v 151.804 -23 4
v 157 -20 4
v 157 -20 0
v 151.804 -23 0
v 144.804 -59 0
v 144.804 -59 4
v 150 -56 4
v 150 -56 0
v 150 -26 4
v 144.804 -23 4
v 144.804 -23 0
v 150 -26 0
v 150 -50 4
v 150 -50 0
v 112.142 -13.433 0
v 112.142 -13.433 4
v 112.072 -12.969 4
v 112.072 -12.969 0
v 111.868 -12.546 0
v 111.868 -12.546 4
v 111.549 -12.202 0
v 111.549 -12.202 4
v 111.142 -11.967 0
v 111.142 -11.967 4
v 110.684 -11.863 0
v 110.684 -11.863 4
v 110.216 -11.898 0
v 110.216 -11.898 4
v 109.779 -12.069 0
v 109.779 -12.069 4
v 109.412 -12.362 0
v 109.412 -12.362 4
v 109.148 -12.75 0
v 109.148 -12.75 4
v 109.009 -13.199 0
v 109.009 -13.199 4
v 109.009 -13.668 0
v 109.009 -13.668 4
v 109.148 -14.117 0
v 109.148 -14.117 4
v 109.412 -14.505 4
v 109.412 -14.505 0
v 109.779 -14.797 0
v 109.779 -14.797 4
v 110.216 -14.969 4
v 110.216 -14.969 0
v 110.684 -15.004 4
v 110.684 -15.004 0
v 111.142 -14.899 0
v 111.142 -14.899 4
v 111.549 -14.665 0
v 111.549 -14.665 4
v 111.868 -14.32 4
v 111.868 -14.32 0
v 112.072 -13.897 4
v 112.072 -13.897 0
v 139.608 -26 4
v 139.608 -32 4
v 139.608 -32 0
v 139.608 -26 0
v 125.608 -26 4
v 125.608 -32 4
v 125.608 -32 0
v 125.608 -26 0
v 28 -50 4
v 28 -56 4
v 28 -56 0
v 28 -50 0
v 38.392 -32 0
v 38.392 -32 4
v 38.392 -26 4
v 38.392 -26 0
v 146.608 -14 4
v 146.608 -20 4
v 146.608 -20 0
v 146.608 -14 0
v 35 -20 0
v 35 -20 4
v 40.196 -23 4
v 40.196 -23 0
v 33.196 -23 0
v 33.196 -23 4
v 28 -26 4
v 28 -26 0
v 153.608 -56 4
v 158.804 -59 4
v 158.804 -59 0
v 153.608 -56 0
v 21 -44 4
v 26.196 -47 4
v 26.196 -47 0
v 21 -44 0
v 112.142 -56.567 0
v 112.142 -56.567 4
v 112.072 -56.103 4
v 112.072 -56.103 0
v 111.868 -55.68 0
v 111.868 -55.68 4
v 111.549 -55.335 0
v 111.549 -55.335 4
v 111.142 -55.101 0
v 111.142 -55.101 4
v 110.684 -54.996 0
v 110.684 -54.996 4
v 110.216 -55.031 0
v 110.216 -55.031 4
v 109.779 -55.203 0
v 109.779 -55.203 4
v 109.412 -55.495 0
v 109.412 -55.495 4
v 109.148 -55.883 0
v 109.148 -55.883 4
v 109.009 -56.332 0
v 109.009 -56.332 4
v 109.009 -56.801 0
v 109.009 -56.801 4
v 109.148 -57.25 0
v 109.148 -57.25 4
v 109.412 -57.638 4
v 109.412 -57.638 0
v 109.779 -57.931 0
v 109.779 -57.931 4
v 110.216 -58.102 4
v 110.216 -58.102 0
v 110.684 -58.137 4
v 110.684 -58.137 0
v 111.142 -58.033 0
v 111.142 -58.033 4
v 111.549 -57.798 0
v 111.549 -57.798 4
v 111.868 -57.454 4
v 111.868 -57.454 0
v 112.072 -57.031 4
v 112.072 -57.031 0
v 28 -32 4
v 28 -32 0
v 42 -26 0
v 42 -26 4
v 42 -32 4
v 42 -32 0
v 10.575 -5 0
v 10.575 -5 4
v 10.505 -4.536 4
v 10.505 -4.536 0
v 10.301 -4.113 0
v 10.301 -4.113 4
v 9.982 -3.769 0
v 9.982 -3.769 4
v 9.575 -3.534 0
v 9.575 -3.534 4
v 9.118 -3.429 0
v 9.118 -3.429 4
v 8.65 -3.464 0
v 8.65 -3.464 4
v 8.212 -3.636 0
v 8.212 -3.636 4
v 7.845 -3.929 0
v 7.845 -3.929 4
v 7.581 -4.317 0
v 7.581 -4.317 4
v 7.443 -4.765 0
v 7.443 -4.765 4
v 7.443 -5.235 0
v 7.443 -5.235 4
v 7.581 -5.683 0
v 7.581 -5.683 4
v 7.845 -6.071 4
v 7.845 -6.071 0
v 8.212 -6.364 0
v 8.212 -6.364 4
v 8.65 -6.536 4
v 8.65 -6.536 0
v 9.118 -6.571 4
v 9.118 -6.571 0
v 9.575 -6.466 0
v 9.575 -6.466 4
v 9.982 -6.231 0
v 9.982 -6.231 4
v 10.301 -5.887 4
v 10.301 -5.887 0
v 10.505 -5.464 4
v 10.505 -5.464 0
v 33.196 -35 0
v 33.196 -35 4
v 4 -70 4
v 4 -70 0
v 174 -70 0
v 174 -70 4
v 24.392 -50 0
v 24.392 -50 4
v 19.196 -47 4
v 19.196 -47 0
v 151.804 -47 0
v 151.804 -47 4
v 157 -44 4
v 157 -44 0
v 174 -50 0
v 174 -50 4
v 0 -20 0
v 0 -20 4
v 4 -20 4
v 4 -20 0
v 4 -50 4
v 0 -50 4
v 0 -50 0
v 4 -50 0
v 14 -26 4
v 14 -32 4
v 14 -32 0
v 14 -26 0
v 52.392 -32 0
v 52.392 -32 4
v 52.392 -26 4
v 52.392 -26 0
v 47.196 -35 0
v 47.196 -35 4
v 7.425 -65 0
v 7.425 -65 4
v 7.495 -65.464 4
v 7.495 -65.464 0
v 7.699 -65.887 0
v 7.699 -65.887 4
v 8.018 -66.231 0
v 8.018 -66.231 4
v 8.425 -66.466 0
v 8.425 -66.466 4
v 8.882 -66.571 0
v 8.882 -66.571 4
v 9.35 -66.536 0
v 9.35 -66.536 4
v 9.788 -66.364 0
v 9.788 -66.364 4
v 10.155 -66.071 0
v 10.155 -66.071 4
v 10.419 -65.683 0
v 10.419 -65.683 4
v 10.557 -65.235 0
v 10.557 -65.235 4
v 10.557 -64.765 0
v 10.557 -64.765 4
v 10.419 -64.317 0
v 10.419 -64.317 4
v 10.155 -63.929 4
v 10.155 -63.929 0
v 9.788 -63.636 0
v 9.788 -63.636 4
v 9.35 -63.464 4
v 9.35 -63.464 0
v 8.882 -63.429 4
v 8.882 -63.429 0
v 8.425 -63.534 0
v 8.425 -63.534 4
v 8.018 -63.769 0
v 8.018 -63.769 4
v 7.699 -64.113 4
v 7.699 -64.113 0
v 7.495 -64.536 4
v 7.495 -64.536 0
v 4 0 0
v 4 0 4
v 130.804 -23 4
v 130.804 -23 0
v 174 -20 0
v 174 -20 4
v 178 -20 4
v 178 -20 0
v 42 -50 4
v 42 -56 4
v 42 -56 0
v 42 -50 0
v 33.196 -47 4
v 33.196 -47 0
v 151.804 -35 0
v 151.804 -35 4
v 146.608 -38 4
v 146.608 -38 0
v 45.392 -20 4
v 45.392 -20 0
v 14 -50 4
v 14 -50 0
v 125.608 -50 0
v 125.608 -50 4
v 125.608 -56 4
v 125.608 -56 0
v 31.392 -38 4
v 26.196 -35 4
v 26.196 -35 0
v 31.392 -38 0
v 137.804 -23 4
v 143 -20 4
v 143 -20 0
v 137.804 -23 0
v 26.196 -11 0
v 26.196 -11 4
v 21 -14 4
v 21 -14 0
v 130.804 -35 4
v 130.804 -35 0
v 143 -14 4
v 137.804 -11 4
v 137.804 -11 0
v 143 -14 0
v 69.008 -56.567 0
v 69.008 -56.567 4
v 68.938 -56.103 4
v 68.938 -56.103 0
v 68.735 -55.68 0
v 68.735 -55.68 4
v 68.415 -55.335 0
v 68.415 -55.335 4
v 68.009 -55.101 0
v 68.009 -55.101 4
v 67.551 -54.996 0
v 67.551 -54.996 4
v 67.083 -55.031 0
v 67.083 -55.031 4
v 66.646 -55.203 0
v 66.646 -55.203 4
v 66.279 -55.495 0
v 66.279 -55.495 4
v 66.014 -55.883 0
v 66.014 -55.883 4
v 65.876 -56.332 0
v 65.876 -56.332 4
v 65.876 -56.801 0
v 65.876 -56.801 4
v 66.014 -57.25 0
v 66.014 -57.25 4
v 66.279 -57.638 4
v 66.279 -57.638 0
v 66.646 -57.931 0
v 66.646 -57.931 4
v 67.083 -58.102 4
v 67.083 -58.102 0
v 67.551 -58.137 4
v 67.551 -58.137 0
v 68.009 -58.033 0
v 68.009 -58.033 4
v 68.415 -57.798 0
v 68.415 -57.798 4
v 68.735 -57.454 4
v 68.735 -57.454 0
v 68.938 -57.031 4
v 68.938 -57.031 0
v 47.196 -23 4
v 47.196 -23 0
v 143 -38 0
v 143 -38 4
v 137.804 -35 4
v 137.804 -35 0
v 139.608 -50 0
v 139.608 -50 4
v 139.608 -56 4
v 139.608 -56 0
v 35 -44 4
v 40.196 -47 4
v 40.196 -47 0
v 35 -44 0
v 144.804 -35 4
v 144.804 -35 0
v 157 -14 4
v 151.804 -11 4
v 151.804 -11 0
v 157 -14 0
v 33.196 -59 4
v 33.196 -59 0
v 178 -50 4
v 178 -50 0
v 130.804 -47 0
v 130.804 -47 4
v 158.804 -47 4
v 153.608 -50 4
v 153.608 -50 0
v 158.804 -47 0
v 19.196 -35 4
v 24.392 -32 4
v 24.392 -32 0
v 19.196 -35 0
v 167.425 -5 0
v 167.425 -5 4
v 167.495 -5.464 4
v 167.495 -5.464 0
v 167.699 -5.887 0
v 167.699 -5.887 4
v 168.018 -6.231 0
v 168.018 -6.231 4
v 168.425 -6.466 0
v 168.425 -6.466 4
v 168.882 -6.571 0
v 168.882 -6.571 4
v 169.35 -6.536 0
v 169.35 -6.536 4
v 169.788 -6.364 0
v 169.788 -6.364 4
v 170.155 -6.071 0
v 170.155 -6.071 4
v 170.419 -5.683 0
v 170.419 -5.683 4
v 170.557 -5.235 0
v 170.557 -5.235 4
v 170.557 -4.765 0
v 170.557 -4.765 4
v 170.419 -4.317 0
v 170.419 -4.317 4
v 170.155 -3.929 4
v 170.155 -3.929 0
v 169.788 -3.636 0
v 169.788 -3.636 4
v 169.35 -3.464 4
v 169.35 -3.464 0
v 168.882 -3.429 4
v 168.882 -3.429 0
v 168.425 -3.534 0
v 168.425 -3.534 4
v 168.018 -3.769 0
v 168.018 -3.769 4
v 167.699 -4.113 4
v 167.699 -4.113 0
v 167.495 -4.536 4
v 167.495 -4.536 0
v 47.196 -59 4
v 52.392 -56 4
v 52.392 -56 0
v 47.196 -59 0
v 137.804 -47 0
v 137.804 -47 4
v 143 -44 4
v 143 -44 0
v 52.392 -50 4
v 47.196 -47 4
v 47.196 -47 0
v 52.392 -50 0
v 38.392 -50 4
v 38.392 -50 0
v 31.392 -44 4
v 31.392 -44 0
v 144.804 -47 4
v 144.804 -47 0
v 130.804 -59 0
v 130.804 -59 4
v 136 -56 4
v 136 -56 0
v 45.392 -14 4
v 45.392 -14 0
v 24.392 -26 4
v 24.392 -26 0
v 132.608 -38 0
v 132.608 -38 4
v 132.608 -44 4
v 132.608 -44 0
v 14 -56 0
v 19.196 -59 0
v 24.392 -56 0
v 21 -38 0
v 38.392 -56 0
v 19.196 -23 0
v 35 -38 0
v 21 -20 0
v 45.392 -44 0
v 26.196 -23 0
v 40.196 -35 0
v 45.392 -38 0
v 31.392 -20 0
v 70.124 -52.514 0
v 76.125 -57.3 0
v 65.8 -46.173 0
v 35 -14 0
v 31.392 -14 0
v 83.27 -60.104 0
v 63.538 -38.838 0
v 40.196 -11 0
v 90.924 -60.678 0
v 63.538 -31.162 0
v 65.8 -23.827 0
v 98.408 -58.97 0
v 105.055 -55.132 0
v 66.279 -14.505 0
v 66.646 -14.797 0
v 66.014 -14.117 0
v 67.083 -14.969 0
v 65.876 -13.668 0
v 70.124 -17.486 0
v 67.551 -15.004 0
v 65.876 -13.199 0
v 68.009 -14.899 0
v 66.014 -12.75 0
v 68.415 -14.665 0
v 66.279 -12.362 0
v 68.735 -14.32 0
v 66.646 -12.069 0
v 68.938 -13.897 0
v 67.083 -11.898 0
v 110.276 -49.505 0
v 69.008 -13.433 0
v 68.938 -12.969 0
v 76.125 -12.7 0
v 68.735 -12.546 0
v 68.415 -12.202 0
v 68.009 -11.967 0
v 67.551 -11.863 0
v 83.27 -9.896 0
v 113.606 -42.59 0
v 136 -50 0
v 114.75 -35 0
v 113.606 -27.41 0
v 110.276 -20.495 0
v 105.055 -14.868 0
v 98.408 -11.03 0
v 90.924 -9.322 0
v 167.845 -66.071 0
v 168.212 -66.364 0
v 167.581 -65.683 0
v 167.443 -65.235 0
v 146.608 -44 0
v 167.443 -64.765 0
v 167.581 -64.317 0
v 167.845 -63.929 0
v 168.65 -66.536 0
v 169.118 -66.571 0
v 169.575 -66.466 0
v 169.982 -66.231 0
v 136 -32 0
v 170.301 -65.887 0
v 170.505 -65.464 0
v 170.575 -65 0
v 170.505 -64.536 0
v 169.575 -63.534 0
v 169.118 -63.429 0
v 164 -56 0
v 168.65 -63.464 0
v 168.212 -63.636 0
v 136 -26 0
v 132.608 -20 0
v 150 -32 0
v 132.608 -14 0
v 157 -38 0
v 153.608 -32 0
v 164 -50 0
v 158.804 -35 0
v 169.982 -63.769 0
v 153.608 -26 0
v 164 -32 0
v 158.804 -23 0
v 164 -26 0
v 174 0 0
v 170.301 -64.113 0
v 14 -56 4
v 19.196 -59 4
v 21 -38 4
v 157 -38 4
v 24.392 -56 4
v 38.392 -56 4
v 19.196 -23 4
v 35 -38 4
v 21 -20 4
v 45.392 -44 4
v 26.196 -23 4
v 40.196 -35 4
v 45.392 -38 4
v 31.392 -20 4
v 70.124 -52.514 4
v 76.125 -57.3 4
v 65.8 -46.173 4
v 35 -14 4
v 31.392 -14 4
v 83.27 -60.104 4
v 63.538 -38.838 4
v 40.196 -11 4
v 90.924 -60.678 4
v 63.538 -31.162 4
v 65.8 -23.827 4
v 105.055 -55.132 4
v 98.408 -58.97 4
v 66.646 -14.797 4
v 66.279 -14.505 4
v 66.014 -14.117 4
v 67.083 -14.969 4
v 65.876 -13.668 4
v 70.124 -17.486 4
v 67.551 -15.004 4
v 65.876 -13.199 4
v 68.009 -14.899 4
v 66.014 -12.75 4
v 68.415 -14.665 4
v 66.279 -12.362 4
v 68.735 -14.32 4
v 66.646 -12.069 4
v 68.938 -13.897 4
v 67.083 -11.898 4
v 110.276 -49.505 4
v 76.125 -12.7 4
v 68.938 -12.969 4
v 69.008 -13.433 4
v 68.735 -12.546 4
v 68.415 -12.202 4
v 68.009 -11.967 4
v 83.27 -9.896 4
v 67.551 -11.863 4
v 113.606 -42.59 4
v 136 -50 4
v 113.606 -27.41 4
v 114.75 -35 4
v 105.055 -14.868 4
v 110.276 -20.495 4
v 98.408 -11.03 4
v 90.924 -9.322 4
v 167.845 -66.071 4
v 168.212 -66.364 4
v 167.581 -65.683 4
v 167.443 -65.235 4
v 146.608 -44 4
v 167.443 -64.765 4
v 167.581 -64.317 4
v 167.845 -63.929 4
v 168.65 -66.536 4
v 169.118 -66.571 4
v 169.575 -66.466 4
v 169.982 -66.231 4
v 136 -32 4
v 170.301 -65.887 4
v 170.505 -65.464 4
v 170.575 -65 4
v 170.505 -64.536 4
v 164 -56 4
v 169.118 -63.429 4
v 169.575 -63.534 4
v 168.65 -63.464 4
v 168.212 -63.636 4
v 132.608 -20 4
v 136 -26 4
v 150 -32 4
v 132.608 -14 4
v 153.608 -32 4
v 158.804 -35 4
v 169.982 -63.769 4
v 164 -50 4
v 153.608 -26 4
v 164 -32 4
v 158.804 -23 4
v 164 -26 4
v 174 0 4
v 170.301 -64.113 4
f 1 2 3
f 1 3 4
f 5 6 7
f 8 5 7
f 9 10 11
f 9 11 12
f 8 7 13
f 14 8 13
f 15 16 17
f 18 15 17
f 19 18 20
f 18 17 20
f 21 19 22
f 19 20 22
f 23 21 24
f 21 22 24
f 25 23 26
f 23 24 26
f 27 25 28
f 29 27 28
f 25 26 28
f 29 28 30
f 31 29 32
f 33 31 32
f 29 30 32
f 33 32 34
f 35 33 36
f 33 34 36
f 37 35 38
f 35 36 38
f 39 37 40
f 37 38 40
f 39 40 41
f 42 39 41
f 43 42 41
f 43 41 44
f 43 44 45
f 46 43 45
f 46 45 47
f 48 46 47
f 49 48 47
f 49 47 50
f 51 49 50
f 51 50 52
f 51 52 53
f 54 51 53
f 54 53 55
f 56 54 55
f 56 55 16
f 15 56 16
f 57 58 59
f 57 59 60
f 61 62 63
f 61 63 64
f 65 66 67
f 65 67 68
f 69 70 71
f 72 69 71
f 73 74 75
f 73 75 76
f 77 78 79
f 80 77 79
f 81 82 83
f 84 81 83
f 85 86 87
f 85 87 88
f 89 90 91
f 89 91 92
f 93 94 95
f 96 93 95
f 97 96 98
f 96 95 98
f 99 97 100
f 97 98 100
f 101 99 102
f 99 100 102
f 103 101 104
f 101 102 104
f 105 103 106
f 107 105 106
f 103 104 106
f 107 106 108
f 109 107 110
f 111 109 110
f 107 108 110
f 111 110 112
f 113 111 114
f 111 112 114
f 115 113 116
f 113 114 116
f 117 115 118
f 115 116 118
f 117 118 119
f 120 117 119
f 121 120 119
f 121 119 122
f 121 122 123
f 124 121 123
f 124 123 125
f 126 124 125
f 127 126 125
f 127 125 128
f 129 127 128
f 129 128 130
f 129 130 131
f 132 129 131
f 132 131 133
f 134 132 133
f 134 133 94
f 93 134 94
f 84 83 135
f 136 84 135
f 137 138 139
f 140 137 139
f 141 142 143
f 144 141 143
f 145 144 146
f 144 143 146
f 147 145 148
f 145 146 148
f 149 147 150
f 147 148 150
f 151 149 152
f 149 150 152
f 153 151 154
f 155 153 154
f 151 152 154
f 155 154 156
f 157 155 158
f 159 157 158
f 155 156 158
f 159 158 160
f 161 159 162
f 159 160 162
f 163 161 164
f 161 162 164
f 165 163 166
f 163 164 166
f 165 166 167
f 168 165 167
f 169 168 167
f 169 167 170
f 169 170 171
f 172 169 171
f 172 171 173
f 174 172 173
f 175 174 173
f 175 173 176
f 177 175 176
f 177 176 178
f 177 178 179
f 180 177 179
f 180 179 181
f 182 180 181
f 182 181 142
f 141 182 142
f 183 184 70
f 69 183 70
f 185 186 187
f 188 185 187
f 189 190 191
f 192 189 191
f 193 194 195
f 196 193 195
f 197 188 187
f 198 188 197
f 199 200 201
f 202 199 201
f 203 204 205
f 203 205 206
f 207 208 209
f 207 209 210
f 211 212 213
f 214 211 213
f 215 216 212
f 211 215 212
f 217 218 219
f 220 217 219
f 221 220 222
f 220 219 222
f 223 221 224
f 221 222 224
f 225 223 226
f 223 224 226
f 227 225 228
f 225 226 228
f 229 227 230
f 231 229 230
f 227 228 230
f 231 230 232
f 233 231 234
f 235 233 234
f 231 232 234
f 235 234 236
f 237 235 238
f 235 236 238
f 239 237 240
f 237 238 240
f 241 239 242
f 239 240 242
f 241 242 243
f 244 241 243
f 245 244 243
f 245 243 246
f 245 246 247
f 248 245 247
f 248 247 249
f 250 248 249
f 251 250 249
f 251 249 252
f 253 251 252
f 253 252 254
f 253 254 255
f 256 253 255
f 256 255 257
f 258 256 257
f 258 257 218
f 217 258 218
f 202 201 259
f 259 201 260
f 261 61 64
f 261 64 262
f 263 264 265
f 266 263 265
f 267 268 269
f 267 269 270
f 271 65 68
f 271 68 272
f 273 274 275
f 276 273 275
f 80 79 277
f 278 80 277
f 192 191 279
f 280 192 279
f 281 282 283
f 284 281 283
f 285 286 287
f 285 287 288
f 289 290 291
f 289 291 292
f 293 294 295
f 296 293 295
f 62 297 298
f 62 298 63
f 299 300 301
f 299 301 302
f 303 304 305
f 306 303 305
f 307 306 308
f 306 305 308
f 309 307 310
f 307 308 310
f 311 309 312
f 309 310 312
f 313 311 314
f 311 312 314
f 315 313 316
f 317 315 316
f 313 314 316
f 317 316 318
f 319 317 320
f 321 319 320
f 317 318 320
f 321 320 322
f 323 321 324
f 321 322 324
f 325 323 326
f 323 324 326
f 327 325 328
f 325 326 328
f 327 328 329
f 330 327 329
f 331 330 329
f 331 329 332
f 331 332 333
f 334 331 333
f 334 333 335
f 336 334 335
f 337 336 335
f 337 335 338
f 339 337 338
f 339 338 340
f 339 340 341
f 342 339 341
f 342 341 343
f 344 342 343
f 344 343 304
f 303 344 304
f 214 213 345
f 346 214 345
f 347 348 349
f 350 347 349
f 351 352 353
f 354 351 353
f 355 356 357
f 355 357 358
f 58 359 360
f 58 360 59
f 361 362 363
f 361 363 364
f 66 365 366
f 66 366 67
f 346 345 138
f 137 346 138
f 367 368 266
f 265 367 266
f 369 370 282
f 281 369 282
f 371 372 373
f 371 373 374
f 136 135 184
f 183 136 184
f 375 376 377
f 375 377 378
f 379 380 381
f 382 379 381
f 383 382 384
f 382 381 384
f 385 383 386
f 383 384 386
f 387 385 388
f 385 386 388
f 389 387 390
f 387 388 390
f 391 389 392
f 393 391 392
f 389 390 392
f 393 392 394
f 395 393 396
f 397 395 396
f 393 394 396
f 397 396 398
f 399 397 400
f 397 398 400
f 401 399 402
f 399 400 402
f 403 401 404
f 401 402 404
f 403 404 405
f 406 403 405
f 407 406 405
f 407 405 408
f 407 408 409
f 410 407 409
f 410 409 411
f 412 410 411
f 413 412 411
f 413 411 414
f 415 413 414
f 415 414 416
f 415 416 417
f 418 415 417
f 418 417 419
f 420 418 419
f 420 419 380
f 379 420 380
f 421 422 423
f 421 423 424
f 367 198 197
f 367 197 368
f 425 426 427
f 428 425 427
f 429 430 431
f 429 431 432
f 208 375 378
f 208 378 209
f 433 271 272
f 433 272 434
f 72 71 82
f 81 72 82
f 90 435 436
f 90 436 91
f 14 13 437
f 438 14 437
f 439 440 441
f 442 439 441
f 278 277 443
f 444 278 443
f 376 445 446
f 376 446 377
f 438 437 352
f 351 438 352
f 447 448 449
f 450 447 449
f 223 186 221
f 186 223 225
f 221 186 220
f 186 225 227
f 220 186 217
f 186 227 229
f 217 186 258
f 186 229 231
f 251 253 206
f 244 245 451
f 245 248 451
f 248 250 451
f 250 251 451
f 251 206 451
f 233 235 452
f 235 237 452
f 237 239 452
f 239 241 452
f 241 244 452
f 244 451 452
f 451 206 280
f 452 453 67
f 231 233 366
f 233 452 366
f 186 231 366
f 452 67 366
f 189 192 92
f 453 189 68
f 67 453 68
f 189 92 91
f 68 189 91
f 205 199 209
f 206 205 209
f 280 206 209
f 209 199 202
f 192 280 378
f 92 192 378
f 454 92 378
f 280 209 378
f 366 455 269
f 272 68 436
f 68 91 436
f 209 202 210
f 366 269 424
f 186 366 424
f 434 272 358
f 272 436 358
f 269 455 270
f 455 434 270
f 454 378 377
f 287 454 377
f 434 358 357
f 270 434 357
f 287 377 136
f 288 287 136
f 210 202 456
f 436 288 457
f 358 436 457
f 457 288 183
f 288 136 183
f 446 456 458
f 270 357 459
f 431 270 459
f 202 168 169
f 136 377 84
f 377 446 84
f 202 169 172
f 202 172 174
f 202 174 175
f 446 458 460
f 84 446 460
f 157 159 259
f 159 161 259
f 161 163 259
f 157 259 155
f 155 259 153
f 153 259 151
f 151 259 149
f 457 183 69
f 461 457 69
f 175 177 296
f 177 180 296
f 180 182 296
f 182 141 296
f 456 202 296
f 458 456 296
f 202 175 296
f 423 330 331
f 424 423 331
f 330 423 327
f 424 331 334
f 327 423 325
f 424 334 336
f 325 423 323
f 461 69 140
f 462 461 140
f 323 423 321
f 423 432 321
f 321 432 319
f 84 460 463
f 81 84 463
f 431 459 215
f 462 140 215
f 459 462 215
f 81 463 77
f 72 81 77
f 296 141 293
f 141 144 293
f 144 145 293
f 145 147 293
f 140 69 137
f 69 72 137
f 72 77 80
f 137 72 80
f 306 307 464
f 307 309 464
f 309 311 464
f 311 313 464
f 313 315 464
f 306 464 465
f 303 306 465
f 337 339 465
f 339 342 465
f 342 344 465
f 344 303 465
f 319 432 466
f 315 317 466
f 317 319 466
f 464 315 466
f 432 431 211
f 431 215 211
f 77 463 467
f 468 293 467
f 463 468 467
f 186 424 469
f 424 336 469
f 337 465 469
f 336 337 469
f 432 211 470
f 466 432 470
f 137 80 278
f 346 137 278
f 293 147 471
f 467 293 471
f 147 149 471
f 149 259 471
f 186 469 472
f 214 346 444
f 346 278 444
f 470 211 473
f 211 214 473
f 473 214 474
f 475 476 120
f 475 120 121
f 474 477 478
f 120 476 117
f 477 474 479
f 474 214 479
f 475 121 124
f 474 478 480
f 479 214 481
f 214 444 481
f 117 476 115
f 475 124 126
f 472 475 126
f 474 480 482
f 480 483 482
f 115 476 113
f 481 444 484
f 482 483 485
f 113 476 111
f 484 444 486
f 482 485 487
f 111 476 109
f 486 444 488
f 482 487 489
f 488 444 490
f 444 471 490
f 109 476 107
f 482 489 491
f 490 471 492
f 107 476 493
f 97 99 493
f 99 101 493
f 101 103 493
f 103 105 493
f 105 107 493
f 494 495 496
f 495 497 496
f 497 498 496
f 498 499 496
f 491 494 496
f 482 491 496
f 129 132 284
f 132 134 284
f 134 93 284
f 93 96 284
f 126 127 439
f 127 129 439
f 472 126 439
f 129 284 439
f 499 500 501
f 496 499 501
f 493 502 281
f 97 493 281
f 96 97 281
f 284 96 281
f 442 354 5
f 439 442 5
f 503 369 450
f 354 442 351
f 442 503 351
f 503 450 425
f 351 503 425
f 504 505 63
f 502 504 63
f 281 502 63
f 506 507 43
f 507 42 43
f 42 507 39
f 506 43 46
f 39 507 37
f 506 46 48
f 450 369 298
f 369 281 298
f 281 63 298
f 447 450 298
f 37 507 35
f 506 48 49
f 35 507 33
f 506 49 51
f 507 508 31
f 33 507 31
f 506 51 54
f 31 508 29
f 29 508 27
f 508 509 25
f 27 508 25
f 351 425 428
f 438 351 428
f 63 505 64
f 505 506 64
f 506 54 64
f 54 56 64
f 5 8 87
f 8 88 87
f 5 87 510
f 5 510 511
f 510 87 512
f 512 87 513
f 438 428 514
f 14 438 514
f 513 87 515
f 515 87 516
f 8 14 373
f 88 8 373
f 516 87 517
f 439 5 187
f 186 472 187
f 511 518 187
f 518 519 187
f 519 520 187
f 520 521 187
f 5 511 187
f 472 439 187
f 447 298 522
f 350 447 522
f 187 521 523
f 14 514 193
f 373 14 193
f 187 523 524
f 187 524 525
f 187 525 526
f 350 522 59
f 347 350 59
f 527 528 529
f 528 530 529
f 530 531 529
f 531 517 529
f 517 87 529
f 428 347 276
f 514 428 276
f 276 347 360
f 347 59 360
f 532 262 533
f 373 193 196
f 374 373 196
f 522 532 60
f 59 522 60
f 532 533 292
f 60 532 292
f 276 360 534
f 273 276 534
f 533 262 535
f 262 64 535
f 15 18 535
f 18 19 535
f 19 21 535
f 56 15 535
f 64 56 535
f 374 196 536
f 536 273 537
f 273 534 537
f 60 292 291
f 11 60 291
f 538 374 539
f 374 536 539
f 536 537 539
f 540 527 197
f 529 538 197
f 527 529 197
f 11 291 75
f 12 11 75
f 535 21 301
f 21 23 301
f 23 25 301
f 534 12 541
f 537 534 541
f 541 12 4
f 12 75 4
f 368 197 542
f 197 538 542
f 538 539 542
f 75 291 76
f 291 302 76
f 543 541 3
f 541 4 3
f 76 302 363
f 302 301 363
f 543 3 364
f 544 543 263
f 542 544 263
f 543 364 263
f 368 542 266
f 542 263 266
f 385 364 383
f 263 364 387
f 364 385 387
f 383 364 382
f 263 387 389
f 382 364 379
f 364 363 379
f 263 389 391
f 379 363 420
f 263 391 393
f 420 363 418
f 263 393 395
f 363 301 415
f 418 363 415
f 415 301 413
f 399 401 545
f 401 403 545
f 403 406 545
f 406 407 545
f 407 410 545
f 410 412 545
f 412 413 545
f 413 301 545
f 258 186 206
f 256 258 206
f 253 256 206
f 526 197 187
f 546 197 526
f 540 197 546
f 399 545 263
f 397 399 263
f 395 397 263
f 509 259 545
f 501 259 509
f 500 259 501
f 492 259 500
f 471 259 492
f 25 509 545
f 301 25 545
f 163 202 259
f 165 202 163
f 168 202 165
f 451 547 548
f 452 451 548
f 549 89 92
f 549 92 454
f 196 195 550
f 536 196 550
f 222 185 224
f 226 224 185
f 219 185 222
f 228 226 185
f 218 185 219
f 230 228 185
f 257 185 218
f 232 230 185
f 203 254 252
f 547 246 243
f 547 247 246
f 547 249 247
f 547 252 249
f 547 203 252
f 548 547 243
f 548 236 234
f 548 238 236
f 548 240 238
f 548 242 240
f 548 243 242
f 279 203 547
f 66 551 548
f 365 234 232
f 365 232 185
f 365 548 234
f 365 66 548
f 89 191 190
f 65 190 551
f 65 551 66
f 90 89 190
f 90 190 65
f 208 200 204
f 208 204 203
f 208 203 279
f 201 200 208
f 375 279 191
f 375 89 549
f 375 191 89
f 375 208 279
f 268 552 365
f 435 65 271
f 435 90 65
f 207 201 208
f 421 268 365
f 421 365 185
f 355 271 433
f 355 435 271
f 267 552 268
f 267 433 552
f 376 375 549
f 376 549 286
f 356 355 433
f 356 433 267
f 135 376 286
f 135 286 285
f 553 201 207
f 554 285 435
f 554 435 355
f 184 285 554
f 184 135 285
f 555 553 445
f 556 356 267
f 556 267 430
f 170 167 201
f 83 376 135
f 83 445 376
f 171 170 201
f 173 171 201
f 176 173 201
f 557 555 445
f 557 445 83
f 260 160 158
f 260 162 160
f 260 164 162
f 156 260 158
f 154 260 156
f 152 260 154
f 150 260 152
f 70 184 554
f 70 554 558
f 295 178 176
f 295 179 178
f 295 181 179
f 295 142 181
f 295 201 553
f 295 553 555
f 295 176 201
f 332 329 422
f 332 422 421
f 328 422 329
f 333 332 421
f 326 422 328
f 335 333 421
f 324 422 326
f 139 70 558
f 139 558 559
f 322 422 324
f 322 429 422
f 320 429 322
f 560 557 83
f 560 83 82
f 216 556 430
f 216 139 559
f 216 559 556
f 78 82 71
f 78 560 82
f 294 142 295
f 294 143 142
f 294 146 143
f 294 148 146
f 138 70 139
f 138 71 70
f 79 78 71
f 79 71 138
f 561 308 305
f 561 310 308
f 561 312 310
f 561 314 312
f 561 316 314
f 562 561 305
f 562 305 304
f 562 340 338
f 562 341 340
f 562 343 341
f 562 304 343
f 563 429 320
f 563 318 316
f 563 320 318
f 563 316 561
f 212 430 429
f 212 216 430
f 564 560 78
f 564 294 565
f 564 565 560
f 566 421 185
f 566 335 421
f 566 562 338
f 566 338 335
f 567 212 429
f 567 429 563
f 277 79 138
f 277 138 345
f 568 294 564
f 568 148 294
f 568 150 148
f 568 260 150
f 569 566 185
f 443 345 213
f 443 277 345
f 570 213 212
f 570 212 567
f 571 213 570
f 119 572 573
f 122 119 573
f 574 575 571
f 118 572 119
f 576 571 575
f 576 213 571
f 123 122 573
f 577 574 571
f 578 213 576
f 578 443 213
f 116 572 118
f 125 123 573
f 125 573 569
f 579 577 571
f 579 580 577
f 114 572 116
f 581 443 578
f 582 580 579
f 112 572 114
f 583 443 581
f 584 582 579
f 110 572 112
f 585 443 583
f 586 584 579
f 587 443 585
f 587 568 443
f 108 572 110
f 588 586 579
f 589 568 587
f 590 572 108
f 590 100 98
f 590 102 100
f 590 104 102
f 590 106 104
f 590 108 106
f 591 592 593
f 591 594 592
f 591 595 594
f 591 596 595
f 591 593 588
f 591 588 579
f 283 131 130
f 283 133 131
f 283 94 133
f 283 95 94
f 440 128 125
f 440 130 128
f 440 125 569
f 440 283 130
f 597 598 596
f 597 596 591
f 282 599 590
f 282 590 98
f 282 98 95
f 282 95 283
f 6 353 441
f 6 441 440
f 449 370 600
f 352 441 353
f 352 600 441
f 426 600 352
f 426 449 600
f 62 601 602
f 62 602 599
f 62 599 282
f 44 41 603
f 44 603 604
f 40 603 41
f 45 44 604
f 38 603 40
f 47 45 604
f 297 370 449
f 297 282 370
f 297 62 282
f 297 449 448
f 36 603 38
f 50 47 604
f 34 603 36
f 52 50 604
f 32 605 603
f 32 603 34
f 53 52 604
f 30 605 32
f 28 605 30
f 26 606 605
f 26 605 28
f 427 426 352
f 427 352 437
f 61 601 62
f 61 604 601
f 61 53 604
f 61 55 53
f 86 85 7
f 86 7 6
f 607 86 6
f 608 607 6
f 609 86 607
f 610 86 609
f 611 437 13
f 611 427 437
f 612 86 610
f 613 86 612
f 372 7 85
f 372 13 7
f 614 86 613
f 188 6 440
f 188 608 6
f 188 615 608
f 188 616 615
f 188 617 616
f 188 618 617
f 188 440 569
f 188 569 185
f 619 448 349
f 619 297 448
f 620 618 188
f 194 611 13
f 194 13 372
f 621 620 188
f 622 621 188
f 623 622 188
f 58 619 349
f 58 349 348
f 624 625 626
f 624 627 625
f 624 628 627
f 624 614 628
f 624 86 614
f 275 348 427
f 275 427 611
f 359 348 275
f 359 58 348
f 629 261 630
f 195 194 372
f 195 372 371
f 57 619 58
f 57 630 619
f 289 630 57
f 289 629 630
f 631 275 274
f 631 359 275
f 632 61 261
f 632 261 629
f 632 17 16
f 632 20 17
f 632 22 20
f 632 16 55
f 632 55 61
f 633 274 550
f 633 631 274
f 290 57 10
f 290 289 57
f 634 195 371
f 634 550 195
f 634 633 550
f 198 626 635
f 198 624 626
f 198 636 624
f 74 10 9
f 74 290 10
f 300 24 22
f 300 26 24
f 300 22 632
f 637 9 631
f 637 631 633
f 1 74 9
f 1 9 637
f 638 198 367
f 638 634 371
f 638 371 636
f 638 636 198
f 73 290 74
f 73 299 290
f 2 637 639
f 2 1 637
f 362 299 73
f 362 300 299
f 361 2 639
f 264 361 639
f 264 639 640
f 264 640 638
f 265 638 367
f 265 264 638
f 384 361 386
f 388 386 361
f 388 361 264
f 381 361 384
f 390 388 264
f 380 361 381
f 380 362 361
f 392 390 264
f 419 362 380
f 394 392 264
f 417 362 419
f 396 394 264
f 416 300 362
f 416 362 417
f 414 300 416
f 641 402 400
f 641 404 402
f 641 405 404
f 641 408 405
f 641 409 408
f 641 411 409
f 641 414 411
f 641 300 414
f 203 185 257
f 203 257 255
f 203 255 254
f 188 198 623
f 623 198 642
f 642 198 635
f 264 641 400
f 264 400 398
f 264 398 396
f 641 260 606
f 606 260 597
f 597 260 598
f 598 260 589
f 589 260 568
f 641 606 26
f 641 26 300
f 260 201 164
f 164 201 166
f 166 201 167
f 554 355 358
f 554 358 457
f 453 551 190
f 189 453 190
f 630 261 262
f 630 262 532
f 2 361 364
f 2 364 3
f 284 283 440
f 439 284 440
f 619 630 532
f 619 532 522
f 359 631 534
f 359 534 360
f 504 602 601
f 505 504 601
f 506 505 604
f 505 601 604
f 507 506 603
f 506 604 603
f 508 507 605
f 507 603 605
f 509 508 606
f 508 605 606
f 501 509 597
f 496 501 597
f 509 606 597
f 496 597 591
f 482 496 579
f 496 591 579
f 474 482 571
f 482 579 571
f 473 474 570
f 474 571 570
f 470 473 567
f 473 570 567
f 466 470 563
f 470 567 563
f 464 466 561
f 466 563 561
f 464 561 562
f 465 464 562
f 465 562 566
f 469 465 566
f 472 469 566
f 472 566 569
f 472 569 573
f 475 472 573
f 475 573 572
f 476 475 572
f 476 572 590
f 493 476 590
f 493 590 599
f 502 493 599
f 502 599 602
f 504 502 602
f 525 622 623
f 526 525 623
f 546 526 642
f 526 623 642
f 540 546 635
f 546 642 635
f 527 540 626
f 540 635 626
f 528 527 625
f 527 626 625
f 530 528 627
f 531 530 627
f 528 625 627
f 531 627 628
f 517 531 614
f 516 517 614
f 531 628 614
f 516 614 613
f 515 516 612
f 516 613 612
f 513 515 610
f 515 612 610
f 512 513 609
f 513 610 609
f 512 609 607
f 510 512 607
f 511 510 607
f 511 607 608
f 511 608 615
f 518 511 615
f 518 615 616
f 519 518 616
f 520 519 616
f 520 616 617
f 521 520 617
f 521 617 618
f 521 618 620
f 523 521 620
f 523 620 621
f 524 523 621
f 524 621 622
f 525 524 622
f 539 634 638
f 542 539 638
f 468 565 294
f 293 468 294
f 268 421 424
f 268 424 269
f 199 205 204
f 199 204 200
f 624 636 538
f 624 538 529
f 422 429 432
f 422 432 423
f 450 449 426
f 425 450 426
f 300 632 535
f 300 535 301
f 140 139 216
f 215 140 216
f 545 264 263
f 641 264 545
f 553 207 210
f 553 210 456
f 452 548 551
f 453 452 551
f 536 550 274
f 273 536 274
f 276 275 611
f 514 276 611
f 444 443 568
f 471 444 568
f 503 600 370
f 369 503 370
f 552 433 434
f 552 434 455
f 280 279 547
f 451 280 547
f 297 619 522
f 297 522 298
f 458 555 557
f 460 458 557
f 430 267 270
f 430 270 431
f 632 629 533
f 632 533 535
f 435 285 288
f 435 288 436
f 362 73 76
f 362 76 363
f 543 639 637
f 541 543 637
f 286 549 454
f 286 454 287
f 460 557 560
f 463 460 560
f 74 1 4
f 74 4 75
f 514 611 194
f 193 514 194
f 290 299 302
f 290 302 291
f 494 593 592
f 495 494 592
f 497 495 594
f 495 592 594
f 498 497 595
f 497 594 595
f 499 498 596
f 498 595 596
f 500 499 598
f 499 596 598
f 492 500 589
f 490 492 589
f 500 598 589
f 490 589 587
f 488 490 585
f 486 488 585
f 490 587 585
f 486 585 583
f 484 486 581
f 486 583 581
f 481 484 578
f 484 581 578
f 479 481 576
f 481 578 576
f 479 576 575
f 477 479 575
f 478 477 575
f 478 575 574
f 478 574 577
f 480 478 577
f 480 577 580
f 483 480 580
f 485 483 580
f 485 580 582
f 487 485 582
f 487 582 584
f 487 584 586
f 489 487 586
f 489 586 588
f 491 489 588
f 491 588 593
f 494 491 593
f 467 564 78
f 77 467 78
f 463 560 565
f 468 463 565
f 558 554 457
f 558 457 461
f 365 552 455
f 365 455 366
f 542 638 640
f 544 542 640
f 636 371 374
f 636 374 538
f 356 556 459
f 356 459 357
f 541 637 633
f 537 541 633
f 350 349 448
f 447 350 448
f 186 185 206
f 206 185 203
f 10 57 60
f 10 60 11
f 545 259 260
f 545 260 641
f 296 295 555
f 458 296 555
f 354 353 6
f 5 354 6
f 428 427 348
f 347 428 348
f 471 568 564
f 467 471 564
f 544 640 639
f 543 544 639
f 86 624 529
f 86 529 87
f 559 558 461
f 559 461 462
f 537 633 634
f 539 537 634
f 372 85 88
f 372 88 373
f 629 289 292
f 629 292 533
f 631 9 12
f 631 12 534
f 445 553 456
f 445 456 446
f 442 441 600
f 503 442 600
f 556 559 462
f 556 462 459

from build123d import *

# Parameters (mm, degrees)
SKETCH_1_W          = 178
SKETCH_1_H          = 70
EXTRUDE_1_DEPTH     = 4
SKETCH_2_R          = 25.75
SKETCH_2_R_2        = 1.575
SKETCH_2_W          = 4
SKETCH_2_H          = 20
CUT_EXTRUDE_1_DEPTH = 192.311264697


with BuildPart() as part:
    # 草图1 → 凸台-拉伸1 (new body)
    with BuildSketch(Plane.XY):
        with Locations((89, -35)):
            Rectangle(SKETCH_1_W, SKETCH_1_H)
    extrude(amount=EXTRUDE_1_DEPTH)

    # 草图2 → 切除-拉伸1 (cut, through all)
    with BuildSketch(Plane.XY.offset(4)):
        with Locations((89, -35)):
            Circle(SKETCH_2_R)
        with Locations((9, -5)):
            Circle(SKETCH_2_R_2)
        with Locations(Location((9, -65, 0), (0, 0, 180))):
            Circle(SKETCH_2_R_2)
        with Locations((169, -65)):
            Circle(SKETCH_2_R_2)
        with Locations(Location((169, -5, 0), (0, 0, 180))):
            Circle(SKETCH_2_R_2)
        with Locations((67.433243174, -13.433243174)):
            Circle(SKETCH_2_R_2)
        with Locations((110.566756826, -13.433243174)):
            Circle(SKETCH_2_R_2)
        with Locations((110.566756826, -56.566756826)):
            Circle(SKETCH_2_R_2)
        with Locations((67.433243174, -56.566756826)):
            Circle(SKETCH_2_R_2)
        with Locations((2, -10)):
            Rectangle(SKETCH_2_W, SKETCH_2_H)
        with Locations((176, -10)):
            Rectangle(SKETCH_2_W, SKETCH_2_H)
        with Locations((176, -60)):
            Rectangle(SKETCH_2_W, SKETCH_2_H)
        with Locations((2, -60)):
            Rectangle(SKETCH_2_W, SKETCH_2_H)
        Polygon((40.196152423, -11), (35, -14), (35, -20), (40.196152423, -23), (45.392304845, -20), (45.392304845, -14), align=None)
        Polygon((26.196152423, -23), (31.392304845, -20), (31.392304845, -14), (26.196152423, -11), (21, -14), (21, -20), align=None)
        Polygon((33.196152423, -35), (38.392304845, -32), (38.392304845, -26), (33.196152423, -23), (28, -26), (28, -32), align=None)
        Polygon((52.392304845, -26), (47.196152423, -23), (42, -26), (42, -32), (47.196152423, -35), (52.392304845, -32), align=None)
        Polygon((24.392304845, -26), (24.392304845, -32), (19.196152423, -35), (14, -32), (14, -26), (19.196152423, -23), align=None)
        Polygon((45.392304845, -38), (45.392304845, -44), (40.196152423, -47), (35, -44), (35, -38), (40.196152423, -35), align=None)
        Polygon((21, -38), (26.196152423, -35), (31.392304845, -38), (31.392304845, -44), (26.196152423, -47), (21, -44), align=None)
        Polygon((14, -56), (19.196152423, -59), (24.392304845, -56), (24.392304845, -50), (19.196152423, -47), (14, -50), align=None)
        Polygon((42, -56), (42, -50), (47.196152423, -47), (52.392304845, -50), (52.392304845, -56), (47.196152423, -59), align=None)
        Polygon((28, -50), (33.196152423, -47), (38.392304845, -50), (38.392304845, -56), (33.196152423, -59), (28, -56), align=None)
        Polygon((144.803847577, -47), (139.607695155, -50), (139.607695155, -56), (144.803847577, -59), (150, -56), (150, -50), align=None)
        Polygon((125.607695155, -56), (130.803847577, -59), (136, -56), (136, -50), (130.803847577, -47), (125.607695155, -50), align=None)
        Polygon((153.607695155, -56), (153.607695155, -50), (158.803847577, -47), (164, -50), (164, -56), (158.803847577, -59), align=None)
        Polygon((137.803847577, -47), (143, -44), (143, -38), (137.803847577, -35), (132.607695155, -38), (132.607695155, -44), align=None)
        Polygon((151.803847577, -35), (146.607695155, -38), (146.607695155, -44), (151.803847577, -47), (157, -44), (157, -38), align=None)
        Polygon((164, -26), (158.803847577, -23), (153.607695155, -26), (153.607695155, -32), (158.803847577, -35), (164, -32), align=None)
        Polygon((136, -26), (136, -32), (130.803847577, -35), (125.607695155, -32), (125.607695155, -26), (130.803847577, -23), align=None)
        Polygon((150, -32), (144.803847577, -35), (139.607695155, -32), (139.607695155, -26), (144.803847577, -23), (150, -26), align=None)
        Polygon((132.607695155, -20), (132.607695155, -14), (137.803847577, -11), (143, -14), (143, -20), (137.803847577, -23), align=None)
        Polygon((157, -20), (151.803847577, -23), (146.607695155, -20), (146.607695155, -14), (151.803847577, -11), (157, -14), align=None)
    extrude(amount=-CUT_EXTRUDE_1_DEPTH, mode=Mode.SUBTRACT)


solid = part.part
